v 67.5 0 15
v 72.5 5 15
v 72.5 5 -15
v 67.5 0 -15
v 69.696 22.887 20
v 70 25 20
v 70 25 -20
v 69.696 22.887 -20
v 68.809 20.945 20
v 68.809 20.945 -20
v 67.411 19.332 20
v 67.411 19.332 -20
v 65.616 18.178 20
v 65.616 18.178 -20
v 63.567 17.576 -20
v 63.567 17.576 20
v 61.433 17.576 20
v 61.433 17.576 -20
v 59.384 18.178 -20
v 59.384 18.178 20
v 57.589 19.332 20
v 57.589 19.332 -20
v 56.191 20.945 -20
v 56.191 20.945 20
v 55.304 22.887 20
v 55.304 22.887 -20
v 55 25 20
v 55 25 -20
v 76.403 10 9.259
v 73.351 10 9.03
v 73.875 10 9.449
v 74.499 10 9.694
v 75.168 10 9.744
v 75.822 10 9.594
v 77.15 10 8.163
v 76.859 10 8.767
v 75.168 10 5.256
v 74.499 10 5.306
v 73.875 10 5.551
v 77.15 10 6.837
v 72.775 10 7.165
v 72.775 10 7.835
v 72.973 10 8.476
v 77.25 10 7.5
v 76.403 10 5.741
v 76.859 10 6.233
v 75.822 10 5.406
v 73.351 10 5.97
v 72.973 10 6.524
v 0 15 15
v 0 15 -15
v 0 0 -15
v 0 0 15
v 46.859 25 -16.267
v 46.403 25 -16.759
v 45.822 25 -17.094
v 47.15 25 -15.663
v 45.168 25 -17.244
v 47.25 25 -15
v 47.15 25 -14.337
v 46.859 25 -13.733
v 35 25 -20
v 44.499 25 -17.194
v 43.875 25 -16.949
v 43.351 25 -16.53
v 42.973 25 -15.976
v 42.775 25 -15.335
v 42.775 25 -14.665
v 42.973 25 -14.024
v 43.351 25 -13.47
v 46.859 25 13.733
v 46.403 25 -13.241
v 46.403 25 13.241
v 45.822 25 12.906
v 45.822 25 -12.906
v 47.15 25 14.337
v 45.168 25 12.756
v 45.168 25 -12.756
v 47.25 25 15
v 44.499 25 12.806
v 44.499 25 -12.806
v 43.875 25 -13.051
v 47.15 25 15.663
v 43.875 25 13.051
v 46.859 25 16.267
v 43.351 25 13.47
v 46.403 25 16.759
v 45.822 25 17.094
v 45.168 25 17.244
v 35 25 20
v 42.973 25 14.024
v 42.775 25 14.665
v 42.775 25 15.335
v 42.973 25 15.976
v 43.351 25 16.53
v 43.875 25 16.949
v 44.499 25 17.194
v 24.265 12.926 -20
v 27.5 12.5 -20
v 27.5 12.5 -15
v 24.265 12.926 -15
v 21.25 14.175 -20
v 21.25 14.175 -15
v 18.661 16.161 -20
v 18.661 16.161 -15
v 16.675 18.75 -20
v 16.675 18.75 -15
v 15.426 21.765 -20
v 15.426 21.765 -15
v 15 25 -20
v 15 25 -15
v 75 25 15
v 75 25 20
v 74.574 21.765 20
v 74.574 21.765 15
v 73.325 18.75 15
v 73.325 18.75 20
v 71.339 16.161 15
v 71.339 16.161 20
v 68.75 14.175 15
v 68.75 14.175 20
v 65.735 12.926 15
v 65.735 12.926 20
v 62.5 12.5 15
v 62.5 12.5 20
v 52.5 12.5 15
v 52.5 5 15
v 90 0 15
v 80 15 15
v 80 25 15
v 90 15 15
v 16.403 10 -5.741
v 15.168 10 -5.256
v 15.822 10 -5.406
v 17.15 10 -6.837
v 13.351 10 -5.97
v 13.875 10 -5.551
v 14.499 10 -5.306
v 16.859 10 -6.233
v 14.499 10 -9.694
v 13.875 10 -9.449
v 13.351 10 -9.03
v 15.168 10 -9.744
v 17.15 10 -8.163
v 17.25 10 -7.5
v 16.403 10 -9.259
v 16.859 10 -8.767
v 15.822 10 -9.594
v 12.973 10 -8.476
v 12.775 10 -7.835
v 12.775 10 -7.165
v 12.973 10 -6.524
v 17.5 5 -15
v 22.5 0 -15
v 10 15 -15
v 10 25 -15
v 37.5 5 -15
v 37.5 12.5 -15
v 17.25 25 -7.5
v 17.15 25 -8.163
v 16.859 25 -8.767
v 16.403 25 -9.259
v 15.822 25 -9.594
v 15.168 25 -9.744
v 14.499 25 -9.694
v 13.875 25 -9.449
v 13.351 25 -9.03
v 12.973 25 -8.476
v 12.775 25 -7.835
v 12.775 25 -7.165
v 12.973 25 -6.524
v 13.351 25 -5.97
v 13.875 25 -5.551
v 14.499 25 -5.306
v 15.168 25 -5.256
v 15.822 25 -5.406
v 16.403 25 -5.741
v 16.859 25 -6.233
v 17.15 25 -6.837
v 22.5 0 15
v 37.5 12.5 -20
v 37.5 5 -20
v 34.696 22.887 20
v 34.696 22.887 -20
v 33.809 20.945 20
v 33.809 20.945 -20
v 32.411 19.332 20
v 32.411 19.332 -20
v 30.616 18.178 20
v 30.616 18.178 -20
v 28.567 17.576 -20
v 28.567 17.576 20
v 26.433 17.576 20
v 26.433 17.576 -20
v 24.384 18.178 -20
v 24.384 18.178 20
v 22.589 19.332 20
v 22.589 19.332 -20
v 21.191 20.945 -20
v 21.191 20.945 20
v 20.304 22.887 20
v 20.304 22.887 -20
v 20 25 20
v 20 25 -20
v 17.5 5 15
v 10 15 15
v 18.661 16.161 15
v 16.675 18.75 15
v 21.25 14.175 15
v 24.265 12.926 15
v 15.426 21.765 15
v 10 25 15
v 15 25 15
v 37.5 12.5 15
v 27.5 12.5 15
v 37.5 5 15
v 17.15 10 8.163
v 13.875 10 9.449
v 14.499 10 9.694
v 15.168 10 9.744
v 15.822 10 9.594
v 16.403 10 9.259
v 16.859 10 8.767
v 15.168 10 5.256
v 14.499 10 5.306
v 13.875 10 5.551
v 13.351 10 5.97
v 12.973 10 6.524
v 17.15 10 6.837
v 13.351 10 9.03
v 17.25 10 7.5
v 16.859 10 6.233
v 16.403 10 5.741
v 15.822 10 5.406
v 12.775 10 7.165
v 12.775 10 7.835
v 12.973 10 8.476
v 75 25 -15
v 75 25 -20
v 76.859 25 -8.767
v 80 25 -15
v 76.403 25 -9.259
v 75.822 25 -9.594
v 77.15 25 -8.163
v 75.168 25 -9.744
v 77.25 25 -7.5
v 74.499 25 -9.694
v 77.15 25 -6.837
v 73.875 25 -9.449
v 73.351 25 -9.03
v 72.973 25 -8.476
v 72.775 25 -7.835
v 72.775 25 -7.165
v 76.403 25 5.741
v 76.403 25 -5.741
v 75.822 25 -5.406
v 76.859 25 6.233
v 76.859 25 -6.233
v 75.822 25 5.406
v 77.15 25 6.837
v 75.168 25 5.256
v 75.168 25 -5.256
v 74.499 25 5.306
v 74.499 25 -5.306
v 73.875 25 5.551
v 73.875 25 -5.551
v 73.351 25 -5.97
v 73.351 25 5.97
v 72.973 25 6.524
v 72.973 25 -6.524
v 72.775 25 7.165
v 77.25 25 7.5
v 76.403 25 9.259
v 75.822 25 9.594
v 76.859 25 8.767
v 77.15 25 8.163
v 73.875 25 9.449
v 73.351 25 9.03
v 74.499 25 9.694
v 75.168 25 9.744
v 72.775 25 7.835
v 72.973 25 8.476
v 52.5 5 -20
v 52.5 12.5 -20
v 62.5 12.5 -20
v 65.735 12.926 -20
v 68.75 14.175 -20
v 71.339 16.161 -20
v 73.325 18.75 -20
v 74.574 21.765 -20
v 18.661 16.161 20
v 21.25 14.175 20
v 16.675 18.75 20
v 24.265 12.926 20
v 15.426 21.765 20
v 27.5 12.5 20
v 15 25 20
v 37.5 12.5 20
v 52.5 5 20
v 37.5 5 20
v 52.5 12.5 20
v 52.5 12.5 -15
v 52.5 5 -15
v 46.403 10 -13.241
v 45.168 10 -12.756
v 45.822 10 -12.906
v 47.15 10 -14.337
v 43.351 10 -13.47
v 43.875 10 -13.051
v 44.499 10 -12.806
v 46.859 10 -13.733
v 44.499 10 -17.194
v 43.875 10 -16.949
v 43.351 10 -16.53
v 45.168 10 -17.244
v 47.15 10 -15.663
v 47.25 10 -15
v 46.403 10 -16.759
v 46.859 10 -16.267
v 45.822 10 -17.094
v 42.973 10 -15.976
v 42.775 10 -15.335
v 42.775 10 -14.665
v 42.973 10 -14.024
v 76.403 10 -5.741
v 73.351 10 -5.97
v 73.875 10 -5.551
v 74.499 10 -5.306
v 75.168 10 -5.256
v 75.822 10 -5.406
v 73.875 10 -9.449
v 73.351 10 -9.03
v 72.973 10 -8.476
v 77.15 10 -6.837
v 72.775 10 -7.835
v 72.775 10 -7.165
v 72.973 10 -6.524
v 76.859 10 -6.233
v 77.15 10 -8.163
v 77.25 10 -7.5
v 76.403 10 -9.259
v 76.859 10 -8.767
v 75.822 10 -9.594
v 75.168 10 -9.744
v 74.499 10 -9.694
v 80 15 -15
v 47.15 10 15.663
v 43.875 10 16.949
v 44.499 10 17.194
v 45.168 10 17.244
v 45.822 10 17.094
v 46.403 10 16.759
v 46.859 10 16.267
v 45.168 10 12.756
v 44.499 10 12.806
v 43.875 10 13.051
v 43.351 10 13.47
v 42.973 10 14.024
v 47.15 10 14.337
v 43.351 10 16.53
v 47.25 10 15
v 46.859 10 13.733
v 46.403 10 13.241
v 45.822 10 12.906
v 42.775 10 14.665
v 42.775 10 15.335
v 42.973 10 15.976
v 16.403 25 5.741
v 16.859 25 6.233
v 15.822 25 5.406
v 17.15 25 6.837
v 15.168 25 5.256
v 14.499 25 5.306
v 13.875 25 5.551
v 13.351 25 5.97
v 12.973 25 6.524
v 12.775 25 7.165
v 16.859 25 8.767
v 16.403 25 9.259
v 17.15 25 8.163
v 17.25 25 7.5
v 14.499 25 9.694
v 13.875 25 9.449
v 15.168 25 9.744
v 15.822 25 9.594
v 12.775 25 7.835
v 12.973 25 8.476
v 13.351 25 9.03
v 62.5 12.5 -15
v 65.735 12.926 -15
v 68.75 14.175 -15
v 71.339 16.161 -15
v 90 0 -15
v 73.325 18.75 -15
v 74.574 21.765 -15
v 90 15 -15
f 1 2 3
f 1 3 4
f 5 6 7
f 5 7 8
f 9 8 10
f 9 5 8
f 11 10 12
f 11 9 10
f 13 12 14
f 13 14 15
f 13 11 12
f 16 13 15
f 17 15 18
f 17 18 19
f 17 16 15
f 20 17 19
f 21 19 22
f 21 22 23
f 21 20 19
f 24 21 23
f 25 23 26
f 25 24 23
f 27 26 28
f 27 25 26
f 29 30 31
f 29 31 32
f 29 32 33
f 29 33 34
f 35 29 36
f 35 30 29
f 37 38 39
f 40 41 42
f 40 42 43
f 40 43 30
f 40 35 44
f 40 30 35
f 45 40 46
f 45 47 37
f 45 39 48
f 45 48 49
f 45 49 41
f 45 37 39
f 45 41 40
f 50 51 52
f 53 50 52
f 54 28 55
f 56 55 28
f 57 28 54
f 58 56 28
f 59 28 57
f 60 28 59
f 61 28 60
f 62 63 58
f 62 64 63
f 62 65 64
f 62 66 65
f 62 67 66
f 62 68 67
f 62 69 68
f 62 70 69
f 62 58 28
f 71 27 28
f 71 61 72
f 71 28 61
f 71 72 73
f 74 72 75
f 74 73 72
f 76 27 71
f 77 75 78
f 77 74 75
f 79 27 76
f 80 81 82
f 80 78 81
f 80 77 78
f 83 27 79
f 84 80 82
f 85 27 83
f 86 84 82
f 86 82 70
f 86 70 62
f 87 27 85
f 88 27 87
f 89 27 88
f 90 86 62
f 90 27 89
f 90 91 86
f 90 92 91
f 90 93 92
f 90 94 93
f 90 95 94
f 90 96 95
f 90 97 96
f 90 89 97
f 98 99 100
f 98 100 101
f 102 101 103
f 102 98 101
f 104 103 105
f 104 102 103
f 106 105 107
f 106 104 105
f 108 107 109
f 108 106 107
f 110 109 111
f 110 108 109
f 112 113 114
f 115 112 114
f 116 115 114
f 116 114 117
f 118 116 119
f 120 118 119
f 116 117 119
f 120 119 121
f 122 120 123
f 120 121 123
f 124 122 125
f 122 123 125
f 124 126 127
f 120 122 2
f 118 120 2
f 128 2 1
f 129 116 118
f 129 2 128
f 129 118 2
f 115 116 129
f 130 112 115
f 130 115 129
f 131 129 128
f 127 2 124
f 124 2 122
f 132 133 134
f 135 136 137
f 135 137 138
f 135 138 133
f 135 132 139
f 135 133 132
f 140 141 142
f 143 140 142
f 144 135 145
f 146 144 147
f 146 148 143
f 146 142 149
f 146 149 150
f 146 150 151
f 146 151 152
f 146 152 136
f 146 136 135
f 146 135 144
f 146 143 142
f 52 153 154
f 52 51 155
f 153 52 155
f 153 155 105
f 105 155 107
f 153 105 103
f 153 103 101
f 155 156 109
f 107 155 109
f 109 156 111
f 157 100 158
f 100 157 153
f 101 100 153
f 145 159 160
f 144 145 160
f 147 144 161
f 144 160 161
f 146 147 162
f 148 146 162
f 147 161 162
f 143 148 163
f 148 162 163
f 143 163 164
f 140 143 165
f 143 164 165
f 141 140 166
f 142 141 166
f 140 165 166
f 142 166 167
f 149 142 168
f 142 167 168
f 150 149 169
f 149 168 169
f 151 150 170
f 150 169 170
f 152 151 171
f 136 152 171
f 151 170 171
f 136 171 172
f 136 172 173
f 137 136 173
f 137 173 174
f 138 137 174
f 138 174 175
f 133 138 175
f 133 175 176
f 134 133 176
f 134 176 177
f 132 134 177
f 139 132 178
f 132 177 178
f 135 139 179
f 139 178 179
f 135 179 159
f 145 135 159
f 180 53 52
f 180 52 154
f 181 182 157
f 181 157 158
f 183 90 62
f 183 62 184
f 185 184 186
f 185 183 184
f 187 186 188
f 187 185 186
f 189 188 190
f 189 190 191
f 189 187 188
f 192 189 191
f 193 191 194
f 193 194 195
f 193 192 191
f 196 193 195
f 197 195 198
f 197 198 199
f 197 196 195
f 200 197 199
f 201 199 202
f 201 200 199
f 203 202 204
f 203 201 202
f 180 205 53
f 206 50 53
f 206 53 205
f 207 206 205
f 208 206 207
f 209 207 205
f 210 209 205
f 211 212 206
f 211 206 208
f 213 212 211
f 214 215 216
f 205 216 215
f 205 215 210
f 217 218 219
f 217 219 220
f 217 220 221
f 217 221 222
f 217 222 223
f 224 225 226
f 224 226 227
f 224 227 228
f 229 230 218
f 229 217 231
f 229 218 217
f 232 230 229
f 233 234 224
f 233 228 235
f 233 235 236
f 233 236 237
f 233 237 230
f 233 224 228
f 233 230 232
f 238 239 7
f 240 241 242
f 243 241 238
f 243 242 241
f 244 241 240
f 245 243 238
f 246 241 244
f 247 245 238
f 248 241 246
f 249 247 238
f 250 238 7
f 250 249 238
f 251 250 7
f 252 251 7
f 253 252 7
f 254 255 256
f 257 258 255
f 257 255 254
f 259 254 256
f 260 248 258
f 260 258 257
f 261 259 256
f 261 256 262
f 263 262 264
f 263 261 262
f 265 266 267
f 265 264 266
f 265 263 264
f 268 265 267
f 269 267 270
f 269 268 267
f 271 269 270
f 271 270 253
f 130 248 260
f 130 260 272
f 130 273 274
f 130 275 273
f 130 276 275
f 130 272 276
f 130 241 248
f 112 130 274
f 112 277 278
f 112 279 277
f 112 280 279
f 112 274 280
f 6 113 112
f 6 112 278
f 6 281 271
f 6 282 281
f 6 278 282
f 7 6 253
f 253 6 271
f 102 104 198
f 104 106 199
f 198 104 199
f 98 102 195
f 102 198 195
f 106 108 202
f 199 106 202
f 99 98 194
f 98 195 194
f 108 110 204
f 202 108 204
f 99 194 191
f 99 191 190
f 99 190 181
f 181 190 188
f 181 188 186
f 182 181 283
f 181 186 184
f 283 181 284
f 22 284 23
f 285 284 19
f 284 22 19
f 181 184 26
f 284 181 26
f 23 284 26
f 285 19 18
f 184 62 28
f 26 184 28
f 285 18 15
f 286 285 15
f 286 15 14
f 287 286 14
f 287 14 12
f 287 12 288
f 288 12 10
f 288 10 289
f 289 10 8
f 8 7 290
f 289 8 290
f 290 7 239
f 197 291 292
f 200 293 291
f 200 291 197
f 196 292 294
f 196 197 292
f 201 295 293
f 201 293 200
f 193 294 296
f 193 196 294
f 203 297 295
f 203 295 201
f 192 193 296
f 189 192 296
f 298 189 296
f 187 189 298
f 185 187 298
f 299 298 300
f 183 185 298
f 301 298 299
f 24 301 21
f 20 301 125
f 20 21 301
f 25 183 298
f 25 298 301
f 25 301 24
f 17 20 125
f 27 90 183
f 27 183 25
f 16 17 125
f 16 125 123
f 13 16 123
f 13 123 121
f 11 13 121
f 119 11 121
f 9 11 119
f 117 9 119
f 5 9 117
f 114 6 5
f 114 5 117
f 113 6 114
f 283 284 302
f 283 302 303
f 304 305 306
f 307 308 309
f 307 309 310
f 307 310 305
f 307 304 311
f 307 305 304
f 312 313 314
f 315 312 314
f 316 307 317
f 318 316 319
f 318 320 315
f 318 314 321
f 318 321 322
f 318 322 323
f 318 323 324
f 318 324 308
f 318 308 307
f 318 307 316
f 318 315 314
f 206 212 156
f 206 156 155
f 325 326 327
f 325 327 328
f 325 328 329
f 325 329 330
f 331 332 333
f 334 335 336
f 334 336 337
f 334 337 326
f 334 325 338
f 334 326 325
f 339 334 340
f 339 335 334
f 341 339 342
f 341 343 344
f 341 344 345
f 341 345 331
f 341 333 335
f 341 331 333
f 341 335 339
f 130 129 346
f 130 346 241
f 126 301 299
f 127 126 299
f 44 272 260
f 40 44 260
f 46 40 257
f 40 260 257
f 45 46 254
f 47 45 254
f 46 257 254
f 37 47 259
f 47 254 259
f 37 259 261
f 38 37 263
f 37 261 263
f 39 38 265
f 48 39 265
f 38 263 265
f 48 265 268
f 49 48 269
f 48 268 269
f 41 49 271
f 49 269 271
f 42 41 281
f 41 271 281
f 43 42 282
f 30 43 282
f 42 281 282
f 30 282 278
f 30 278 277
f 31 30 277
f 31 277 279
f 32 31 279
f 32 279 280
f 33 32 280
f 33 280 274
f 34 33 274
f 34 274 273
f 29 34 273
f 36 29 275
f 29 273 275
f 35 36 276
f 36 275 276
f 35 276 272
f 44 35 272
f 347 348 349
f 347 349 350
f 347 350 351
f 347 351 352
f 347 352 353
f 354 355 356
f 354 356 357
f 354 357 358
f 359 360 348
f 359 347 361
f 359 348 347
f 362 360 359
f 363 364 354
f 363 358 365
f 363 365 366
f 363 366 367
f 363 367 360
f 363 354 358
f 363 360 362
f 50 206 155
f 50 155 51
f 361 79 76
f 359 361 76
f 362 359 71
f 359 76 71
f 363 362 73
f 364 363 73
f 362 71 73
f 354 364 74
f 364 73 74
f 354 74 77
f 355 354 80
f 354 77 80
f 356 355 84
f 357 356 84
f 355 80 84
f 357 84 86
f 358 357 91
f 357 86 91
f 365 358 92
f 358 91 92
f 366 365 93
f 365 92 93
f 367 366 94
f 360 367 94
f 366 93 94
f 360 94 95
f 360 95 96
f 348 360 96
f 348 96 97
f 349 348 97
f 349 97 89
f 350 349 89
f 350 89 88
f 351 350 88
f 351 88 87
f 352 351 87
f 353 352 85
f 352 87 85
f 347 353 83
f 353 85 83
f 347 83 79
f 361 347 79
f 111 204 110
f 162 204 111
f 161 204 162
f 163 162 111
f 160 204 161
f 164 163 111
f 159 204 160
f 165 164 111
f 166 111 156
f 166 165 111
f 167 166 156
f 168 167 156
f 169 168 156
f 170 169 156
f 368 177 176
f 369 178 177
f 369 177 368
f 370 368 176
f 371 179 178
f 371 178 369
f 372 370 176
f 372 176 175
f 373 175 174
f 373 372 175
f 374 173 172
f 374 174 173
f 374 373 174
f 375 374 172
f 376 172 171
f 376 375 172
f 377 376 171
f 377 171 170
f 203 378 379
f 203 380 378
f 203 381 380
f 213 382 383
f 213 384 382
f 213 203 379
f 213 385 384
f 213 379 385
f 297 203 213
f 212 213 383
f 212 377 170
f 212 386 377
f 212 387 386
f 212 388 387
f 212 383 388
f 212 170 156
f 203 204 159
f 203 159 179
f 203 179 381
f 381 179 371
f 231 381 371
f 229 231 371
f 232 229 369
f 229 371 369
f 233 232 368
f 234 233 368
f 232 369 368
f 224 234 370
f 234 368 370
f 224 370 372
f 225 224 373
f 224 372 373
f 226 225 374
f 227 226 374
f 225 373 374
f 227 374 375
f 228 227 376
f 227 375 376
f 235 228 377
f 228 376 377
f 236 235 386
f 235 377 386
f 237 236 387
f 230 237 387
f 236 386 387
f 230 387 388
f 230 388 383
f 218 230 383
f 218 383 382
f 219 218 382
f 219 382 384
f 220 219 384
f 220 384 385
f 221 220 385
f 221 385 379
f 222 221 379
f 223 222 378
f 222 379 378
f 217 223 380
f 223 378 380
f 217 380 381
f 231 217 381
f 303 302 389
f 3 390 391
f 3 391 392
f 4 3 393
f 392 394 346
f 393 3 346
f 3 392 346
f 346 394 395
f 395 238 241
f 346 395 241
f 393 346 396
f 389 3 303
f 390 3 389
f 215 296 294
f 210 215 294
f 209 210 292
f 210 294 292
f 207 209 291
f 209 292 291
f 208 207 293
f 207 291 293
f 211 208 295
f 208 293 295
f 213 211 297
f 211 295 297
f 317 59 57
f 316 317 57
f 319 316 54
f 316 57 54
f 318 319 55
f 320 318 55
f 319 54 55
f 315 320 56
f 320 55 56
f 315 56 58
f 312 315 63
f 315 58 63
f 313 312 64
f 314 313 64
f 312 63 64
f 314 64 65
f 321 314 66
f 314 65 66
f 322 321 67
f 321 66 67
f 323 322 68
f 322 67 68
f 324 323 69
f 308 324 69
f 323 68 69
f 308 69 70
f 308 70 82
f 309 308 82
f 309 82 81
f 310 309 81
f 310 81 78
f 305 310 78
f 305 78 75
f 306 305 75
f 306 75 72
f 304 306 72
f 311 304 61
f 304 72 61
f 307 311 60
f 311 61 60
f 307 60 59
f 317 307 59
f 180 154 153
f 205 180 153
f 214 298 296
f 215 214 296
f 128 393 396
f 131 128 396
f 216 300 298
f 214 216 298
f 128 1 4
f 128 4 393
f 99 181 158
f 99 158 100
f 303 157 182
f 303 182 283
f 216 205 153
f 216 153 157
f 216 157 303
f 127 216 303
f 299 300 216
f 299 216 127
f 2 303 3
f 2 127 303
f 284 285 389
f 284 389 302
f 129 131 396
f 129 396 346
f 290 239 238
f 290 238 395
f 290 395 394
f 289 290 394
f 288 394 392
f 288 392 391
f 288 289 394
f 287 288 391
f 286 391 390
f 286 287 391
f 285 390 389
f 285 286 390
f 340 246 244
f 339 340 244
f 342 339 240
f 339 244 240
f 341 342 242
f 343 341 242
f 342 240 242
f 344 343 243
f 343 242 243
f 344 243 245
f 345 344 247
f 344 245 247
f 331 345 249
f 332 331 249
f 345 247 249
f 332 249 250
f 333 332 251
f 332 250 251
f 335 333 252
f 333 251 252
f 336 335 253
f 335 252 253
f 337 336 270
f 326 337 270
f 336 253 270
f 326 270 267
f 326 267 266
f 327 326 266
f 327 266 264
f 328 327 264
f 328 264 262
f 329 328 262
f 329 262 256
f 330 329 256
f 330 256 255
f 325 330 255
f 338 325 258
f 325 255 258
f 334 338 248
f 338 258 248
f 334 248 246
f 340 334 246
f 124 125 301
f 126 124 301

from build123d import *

# Parameters (mm, degrees)
BOSS_EXTRUDE1_DEPTH = 20
CUT_EXTRUDE1_DEPTH  = 5
SKETCH3_R           = 2.25
CUT_EXTRUDE2_DEPTH  = 15


with BuildPart() as part:
    # Sketch1 → Boss-Extrude1 (new body, symmetric)
    with BuildSketch(Plane.XY):
        with BuildLine():
            Line((0, 0), (22.5, 0))
            Line((22.5, 0), (17.5, 5))
            Line((17.5, 5), (72.5, 5))
            Line((72.5, 5), (67.5, 0))
            Line((67.5, 0), (90, 0))
            Line((90, 0), (90, 15))
            Line((90, 15), (80, 15))
            Line((80, 15), (80, 25))
            Line((80, 25), (70, 25))
            ThreePointArc((70, 25), (62.5, 17.5), (55, 25))
            Line((55, 25), (35, 25))
            ThreePointArc((35, 25), (27.5, 17.5), (20, 25))
            Line((20, 25), (10, 25))
            Line((10, 25), (10, 15))
            Line((10, 15), (0, 15))
            Line((0, 15), (0, 0))
        make_face()
    extrude(amount=BOSS_EXTRUDE1_DEPTH, both=True)

    # Sketch2 → Cut-Extrude1 (cut)
    with BuildSketch(Plane.XY.offset(20)):
        with BuildLine():
            Line((17.5, 5), (37.5, 5))
            Line((37.5, 5), (37.5, 12.5))
            Line((37.5, 12.5), (27.5, 12.5))
            ThreePointArc((27.5, 12.5), (18.661165235, 16.161165235), (15, 25))
            Line((15, 25), (10, 25))
            Line((10, 25), (10, 15))
            Line((10, 15), (0, 15))
            Line((0, 15), (0, 0))
            Line((0, 0), (22.5, 0))
            Line((22.5, 0), (17.5, 5))
        make_face()
        with BuildLine():
            Line((62.5, 12.5), (52.5, 12.5))
            Line((52.5, 12.5), (52.5, 5))
            Line((52.5, 5), (72.5, 5))
            Line((72.5, 5), (67.5, 0))
            Line((67.5, 0), (90, 0))
            Line((90, 0), (90, 15))
            Line((90, 15), (80, 15))
            Line((80, 15), (80, 25))
            Line((80, 25), (75, 25))
            ThreePointArc((75, 25), (71.338834765, 16.161165235), (62.5, 12.5))
        make_face()
    cut_extrude1 = extrude(amount=-CUT_EXTRUDE1_DEPTH, mode=Mode.SUBTRACT)

    # Mirror1: Cut-Extrude1 across plane
    add(cut_extrude1.mirror(Plane.XY), mode=Mode.SUBTRACT)

    # Sketch3 → Cut-Extrude2 (cut)
    with BuildSketch(Plane(origin=(0, 25, 0), x_dir=(1, 0, 0), z_dir=(0, 1, 0))):
        with Locations((45, 15)):
            Circle(SKETCH3_R)
        with Locations((45, -15)):
            Circle(SKETCH3_R)
        with Locations((75, 7.5)):
            Circle(SKETCH3_R)
        with Locations((75, -7.5)):
            Circle(SKETCH3_R)
        with Locations((15, 7.5)):
            Circle(SKETCH3_R)
        with Locations((15, -7.5)):
            Circle(SKETCH3_R)
    extrude(amount=-CUT_EXTRUDE2_DEPTH, mode=Mode.SUBTRACT)


solid = part.part
